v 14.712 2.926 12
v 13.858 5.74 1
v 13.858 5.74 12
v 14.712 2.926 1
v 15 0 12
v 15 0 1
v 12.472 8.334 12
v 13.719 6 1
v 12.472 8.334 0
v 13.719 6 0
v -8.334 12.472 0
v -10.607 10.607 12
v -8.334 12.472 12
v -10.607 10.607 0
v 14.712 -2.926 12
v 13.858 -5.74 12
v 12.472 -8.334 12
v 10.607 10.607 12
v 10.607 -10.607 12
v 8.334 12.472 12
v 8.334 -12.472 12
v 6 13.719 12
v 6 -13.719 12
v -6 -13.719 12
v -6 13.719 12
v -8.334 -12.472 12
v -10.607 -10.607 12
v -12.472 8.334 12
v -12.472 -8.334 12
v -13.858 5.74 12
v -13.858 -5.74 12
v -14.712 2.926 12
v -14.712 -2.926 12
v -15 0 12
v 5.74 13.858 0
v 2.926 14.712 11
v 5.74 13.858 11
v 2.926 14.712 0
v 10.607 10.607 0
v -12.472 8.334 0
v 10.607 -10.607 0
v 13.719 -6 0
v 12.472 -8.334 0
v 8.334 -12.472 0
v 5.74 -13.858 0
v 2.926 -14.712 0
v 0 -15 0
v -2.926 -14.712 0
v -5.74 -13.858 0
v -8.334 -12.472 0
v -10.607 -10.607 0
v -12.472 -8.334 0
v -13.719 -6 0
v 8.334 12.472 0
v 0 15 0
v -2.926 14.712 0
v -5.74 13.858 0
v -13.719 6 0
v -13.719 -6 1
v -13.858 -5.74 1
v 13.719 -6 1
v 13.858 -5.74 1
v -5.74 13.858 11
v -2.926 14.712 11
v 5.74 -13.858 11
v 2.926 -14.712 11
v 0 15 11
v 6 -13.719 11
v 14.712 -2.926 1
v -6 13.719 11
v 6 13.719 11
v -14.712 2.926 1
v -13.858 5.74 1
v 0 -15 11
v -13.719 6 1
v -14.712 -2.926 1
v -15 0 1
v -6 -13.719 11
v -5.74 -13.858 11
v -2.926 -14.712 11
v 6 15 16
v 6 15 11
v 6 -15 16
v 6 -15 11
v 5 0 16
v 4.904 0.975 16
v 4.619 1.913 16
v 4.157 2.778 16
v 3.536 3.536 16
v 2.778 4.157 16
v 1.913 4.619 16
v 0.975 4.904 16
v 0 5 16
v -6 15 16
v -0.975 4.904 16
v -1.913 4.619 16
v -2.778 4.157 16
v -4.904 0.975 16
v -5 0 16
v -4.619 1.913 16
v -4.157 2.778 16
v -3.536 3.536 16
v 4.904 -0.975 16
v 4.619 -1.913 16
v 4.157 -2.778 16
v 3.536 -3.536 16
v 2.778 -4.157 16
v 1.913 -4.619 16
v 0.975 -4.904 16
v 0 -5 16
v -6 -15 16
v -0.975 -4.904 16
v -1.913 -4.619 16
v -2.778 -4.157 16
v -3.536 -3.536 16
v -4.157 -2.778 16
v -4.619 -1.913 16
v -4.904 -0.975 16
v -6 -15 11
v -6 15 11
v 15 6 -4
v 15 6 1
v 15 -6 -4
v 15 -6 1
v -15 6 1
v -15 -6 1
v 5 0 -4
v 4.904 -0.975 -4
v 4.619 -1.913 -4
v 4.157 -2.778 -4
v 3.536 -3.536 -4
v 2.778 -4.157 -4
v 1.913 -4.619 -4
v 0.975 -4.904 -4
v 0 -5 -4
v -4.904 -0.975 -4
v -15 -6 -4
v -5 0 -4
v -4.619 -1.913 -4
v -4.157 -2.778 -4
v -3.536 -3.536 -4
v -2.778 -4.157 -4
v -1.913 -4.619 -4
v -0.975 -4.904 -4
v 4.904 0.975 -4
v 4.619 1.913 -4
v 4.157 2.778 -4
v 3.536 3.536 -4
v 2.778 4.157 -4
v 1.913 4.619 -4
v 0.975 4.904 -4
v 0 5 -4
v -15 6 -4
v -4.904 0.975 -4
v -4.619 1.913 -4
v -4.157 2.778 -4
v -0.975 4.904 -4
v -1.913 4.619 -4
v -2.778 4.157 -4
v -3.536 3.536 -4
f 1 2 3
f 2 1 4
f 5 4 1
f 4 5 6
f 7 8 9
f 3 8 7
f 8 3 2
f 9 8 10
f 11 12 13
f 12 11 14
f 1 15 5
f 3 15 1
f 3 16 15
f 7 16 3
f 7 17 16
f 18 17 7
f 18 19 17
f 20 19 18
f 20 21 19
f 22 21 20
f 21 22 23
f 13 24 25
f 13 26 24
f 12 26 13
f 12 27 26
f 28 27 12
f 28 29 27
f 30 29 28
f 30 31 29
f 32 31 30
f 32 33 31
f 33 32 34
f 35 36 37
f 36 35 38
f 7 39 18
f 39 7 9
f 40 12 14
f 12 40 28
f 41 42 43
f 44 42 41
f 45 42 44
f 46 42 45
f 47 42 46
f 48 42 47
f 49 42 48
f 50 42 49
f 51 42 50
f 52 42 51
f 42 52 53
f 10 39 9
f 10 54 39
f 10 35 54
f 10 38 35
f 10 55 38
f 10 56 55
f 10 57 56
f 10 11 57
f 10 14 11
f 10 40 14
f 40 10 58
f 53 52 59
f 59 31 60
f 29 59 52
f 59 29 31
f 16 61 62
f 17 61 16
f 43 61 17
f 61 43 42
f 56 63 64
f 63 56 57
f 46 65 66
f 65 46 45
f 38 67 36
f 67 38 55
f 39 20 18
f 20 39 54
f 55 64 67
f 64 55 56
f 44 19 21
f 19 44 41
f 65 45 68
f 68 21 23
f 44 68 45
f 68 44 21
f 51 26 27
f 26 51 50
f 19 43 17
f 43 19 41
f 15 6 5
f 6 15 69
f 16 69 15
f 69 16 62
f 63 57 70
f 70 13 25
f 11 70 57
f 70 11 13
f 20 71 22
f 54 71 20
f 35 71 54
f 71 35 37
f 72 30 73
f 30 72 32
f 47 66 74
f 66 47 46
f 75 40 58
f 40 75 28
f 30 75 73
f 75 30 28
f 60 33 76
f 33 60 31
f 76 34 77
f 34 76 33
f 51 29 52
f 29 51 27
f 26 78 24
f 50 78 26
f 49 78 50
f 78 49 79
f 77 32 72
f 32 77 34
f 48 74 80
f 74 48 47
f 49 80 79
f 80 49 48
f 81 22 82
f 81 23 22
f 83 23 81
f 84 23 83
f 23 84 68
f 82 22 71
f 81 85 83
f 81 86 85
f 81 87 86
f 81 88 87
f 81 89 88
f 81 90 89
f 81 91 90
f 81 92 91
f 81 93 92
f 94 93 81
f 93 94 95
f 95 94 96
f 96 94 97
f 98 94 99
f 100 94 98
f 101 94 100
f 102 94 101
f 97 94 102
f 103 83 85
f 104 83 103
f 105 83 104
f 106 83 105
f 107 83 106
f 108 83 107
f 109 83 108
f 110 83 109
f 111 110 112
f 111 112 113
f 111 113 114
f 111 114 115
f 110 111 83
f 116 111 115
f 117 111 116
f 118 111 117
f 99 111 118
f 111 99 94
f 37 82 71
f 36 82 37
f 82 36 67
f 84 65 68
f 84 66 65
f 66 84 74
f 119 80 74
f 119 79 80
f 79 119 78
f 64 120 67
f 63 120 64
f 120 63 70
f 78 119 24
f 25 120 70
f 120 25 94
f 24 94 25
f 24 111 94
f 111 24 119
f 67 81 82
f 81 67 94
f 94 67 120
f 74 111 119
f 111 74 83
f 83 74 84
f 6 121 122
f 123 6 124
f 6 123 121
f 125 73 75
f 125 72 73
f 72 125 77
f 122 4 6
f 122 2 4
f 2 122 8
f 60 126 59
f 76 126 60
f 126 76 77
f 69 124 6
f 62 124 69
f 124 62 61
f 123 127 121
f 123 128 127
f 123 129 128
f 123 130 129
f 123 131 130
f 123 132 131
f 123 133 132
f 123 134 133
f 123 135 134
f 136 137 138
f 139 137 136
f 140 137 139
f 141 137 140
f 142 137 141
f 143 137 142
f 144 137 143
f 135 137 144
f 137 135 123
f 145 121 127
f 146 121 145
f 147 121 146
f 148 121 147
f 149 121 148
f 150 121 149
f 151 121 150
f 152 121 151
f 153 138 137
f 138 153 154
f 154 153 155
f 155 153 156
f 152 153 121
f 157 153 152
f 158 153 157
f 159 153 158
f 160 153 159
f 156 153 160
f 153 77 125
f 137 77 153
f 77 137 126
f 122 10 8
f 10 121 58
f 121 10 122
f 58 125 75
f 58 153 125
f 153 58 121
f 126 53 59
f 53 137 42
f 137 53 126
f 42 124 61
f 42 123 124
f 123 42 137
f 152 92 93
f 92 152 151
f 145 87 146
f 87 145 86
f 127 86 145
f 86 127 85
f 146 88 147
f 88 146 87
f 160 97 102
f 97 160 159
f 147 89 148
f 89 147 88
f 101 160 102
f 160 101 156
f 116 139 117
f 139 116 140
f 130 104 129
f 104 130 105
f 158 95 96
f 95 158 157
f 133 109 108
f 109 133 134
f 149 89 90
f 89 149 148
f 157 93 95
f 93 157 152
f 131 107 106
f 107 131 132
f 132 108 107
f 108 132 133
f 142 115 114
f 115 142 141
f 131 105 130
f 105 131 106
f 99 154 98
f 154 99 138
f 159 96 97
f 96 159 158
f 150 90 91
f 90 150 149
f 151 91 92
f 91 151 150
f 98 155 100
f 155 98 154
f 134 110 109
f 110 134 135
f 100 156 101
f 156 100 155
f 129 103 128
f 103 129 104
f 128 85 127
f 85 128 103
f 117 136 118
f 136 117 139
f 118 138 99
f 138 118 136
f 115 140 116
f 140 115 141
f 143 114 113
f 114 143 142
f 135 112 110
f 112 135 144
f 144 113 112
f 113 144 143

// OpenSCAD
$fn = 32;

// ----------------------------------------------------------------------
// Oldham coupling disc: 30 x 20 mm
// ----------------------------------------------------------------------

// --- parameters (mm) ---
disc_d = 30;              // disc diameter
disc_t = 12;              // disc thickness
tongue_w = 12;            // tongue width
tongue_h = 4;             // tongue height
bore_d = 10;              // centre lightening bore

module disc() {
  cylinder(h = disc_t, d = disc_d);
  /* tongue on the top face, sunk 1 mm into the disc */
  translate([-tongue_w / 2, -disc_d / 2, disc_t - 1]) cube([tongue_w, disc_d, tongue_h + 1]);
  /* slot wall on the bottom face, 90 degrees turned */
  translate([-disc_d / 2, -tongue_w / 2, -tongue_h]) cube([disc_d, tongue_w, tongue_h + 1]);
}

difference() {
  disc();
  translate([0, 0, -tongue_h - 1]) cylinder(h = disc_t + 2 * tongue_h + 2, d = bore_d);
}
